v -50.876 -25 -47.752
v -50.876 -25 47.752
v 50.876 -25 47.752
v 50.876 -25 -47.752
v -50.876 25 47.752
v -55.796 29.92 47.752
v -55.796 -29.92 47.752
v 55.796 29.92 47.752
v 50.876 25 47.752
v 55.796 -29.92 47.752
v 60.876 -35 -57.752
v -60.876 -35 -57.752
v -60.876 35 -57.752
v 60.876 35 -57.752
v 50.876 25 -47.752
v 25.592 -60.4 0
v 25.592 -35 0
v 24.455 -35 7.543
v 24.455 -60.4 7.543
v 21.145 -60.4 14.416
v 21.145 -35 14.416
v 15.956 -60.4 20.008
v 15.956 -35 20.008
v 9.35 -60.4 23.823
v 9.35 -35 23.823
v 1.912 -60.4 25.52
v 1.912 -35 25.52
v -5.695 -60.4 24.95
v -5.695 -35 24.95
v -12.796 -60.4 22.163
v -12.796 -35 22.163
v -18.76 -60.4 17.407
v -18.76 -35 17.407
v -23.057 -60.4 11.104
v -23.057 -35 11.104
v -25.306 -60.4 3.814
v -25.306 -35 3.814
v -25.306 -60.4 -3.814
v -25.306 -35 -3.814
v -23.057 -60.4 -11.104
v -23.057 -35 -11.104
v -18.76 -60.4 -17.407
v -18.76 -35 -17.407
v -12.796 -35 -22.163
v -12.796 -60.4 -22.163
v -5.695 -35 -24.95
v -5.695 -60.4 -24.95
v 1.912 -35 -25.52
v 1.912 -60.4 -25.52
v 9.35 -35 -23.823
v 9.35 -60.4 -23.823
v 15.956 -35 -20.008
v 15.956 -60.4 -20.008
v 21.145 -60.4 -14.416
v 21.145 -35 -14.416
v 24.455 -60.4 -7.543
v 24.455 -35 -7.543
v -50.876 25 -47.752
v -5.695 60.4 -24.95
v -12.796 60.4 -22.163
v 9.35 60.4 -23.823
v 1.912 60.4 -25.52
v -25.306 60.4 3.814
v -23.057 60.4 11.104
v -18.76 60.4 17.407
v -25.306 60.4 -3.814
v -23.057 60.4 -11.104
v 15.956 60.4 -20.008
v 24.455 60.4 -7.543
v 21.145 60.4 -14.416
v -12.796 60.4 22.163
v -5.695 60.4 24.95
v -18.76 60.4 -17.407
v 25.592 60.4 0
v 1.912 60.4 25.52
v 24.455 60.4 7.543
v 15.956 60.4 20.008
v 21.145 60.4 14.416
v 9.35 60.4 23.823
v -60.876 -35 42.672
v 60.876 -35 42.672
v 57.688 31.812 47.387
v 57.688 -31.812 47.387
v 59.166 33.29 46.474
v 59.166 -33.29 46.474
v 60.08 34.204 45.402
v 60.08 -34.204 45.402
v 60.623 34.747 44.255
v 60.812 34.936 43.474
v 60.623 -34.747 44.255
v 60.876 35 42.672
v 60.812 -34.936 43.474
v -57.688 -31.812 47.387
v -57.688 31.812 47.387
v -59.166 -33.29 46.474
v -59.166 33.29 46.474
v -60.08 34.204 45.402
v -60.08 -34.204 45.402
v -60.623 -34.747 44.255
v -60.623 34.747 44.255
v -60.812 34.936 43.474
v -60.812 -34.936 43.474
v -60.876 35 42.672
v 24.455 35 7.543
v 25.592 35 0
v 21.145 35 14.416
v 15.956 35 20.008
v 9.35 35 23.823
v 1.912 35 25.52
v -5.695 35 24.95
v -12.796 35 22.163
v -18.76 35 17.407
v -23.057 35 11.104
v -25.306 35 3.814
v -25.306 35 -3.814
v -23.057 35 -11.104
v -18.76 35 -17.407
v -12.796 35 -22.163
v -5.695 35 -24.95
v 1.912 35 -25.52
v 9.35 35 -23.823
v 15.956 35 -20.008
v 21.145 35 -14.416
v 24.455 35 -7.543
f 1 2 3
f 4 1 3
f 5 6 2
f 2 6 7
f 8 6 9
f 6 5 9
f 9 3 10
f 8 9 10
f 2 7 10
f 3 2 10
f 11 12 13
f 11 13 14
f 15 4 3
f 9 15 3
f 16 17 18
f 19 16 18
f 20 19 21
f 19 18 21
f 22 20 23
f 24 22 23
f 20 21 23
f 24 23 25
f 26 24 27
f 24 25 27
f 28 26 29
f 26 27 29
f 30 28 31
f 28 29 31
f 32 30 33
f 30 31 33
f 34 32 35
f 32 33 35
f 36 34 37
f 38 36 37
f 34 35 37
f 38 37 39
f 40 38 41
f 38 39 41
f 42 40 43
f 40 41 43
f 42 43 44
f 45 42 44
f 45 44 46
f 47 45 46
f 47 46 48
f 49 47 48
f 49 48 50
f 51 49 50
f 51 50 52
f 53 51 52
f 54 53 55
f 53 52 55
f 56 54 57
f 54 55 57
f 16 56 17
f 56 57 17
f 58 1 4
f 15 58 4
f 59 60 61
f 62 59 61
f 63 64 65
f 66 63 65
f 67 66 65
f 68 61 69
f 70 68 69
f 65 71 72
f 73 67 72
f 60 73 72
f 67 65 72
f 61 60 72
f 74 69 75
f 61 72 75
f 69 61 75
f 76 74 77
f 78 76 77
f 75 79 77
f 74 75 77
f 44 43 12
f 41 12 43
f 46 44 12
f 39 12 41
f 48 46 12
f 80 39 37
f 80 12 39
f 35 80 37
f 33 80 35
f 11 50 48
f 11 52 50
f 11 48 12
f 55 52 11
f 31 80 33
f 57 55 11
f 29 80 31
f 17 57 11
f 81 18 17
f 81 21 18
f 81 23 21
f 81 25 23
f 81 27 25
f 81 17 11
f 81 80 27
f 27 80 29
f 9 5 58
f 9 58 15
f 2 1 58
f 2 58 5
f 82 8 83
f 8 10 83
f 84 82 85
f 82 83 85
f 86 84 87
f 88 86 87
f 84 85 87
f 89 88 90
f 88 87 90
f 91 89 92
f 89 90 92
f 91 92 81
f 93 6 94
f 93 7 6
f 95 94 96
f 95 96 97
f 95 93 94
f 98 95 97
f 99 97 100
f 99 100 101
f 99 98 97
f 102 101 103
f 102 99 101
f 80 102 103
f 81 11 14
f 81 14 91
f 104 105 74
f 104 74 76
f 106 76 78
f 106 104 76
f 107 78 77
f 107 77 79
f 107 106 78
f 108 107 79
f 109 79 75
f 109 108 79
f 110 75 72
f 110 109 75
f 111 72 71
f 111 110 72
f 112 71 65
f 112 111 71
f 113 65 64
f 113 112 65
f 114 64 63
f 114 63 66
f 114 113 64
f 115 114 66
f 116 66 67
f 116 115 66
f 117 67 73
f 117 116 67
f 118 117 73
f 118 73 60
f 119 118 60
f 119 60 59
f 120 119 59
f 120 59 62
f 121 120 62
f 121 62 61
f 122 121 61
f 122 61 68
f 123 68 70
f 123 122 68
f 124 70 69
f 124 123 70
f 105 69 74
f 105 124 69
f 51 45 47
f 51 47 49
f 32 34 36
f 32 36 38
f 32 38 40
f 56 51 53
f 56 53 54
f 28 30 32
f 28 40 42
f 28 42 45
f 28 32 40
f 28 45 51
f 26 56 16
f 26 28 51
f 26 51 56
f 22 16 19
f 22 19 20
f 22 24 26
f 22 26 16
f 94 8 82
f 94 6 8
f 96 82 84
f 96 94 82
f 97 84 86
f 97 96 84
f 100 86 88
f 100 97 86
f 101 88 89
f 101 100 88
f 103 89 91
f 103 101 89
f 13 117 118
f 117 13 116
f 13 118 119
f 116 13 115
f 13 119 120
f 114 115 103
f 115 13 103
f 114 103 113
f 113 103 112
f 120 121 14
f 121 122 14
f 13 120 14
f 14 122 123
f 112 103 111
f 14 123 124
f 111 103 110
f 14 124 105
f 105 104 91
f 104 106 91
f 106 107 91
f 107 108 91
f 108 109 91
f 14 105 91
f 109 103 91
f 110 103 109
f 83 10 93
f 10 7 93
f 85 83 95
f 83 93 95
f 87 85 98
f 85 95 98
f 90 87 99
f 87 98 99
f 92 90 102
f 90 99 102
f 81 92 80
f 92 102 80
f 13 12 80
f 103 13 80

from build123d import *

# Parameters (mm, degrees)
F0_W     = 101.7517447472
F0_H     = 95.5048203468
F1_DEPTH = 25
F2_T     = 10
F3_R     = 25.591656965
F4_DEPTH = 25.4
F5_R     = 5.08


# Not quite as in the source:
# - a pattern or mirror of a feature is missing from the dataset's text; its kind, count and spacing are read off the source's solid


with BuildPart() as f1:
    # F0 (on Front) → F1 (new body, symmetric)
    with BuildSketch(Plane.XZ):
        Rectangle(F0_W, F0_H)
    extrude(amount=F1_DEPTH, both=True)

    # F2
    f2_openings = [f1.faces().sort_by_distance(p)[0] for p in [
        (0, 0, 47.75241),
    ]]
    offset(amount=F2_T, openings=f2_openings, kind=Kind.INTERSECTION)

    # F3 (on face) → F4 (join)
    with BuildSketch(Plane.XZ.offset(35)):
        Circle(F3_R)
    f4 = extrude(amount=F4_DEPTH)

    # F4_copies: F4 across plane
    add(f4.mirror(Plane.ZX))

    # F5
    f5_edges = [f1.edges().sort_by_distance(p)[0] for p in [
        (60.875872, 0, 47.75241),
        (0, 35, 47.75241),
        (-60.875872, 0, 47.75241),
        (0, -35, 47.75241),
    ]]
    fillet(f5_edges, radius=F5_R)


solid = f1.part
